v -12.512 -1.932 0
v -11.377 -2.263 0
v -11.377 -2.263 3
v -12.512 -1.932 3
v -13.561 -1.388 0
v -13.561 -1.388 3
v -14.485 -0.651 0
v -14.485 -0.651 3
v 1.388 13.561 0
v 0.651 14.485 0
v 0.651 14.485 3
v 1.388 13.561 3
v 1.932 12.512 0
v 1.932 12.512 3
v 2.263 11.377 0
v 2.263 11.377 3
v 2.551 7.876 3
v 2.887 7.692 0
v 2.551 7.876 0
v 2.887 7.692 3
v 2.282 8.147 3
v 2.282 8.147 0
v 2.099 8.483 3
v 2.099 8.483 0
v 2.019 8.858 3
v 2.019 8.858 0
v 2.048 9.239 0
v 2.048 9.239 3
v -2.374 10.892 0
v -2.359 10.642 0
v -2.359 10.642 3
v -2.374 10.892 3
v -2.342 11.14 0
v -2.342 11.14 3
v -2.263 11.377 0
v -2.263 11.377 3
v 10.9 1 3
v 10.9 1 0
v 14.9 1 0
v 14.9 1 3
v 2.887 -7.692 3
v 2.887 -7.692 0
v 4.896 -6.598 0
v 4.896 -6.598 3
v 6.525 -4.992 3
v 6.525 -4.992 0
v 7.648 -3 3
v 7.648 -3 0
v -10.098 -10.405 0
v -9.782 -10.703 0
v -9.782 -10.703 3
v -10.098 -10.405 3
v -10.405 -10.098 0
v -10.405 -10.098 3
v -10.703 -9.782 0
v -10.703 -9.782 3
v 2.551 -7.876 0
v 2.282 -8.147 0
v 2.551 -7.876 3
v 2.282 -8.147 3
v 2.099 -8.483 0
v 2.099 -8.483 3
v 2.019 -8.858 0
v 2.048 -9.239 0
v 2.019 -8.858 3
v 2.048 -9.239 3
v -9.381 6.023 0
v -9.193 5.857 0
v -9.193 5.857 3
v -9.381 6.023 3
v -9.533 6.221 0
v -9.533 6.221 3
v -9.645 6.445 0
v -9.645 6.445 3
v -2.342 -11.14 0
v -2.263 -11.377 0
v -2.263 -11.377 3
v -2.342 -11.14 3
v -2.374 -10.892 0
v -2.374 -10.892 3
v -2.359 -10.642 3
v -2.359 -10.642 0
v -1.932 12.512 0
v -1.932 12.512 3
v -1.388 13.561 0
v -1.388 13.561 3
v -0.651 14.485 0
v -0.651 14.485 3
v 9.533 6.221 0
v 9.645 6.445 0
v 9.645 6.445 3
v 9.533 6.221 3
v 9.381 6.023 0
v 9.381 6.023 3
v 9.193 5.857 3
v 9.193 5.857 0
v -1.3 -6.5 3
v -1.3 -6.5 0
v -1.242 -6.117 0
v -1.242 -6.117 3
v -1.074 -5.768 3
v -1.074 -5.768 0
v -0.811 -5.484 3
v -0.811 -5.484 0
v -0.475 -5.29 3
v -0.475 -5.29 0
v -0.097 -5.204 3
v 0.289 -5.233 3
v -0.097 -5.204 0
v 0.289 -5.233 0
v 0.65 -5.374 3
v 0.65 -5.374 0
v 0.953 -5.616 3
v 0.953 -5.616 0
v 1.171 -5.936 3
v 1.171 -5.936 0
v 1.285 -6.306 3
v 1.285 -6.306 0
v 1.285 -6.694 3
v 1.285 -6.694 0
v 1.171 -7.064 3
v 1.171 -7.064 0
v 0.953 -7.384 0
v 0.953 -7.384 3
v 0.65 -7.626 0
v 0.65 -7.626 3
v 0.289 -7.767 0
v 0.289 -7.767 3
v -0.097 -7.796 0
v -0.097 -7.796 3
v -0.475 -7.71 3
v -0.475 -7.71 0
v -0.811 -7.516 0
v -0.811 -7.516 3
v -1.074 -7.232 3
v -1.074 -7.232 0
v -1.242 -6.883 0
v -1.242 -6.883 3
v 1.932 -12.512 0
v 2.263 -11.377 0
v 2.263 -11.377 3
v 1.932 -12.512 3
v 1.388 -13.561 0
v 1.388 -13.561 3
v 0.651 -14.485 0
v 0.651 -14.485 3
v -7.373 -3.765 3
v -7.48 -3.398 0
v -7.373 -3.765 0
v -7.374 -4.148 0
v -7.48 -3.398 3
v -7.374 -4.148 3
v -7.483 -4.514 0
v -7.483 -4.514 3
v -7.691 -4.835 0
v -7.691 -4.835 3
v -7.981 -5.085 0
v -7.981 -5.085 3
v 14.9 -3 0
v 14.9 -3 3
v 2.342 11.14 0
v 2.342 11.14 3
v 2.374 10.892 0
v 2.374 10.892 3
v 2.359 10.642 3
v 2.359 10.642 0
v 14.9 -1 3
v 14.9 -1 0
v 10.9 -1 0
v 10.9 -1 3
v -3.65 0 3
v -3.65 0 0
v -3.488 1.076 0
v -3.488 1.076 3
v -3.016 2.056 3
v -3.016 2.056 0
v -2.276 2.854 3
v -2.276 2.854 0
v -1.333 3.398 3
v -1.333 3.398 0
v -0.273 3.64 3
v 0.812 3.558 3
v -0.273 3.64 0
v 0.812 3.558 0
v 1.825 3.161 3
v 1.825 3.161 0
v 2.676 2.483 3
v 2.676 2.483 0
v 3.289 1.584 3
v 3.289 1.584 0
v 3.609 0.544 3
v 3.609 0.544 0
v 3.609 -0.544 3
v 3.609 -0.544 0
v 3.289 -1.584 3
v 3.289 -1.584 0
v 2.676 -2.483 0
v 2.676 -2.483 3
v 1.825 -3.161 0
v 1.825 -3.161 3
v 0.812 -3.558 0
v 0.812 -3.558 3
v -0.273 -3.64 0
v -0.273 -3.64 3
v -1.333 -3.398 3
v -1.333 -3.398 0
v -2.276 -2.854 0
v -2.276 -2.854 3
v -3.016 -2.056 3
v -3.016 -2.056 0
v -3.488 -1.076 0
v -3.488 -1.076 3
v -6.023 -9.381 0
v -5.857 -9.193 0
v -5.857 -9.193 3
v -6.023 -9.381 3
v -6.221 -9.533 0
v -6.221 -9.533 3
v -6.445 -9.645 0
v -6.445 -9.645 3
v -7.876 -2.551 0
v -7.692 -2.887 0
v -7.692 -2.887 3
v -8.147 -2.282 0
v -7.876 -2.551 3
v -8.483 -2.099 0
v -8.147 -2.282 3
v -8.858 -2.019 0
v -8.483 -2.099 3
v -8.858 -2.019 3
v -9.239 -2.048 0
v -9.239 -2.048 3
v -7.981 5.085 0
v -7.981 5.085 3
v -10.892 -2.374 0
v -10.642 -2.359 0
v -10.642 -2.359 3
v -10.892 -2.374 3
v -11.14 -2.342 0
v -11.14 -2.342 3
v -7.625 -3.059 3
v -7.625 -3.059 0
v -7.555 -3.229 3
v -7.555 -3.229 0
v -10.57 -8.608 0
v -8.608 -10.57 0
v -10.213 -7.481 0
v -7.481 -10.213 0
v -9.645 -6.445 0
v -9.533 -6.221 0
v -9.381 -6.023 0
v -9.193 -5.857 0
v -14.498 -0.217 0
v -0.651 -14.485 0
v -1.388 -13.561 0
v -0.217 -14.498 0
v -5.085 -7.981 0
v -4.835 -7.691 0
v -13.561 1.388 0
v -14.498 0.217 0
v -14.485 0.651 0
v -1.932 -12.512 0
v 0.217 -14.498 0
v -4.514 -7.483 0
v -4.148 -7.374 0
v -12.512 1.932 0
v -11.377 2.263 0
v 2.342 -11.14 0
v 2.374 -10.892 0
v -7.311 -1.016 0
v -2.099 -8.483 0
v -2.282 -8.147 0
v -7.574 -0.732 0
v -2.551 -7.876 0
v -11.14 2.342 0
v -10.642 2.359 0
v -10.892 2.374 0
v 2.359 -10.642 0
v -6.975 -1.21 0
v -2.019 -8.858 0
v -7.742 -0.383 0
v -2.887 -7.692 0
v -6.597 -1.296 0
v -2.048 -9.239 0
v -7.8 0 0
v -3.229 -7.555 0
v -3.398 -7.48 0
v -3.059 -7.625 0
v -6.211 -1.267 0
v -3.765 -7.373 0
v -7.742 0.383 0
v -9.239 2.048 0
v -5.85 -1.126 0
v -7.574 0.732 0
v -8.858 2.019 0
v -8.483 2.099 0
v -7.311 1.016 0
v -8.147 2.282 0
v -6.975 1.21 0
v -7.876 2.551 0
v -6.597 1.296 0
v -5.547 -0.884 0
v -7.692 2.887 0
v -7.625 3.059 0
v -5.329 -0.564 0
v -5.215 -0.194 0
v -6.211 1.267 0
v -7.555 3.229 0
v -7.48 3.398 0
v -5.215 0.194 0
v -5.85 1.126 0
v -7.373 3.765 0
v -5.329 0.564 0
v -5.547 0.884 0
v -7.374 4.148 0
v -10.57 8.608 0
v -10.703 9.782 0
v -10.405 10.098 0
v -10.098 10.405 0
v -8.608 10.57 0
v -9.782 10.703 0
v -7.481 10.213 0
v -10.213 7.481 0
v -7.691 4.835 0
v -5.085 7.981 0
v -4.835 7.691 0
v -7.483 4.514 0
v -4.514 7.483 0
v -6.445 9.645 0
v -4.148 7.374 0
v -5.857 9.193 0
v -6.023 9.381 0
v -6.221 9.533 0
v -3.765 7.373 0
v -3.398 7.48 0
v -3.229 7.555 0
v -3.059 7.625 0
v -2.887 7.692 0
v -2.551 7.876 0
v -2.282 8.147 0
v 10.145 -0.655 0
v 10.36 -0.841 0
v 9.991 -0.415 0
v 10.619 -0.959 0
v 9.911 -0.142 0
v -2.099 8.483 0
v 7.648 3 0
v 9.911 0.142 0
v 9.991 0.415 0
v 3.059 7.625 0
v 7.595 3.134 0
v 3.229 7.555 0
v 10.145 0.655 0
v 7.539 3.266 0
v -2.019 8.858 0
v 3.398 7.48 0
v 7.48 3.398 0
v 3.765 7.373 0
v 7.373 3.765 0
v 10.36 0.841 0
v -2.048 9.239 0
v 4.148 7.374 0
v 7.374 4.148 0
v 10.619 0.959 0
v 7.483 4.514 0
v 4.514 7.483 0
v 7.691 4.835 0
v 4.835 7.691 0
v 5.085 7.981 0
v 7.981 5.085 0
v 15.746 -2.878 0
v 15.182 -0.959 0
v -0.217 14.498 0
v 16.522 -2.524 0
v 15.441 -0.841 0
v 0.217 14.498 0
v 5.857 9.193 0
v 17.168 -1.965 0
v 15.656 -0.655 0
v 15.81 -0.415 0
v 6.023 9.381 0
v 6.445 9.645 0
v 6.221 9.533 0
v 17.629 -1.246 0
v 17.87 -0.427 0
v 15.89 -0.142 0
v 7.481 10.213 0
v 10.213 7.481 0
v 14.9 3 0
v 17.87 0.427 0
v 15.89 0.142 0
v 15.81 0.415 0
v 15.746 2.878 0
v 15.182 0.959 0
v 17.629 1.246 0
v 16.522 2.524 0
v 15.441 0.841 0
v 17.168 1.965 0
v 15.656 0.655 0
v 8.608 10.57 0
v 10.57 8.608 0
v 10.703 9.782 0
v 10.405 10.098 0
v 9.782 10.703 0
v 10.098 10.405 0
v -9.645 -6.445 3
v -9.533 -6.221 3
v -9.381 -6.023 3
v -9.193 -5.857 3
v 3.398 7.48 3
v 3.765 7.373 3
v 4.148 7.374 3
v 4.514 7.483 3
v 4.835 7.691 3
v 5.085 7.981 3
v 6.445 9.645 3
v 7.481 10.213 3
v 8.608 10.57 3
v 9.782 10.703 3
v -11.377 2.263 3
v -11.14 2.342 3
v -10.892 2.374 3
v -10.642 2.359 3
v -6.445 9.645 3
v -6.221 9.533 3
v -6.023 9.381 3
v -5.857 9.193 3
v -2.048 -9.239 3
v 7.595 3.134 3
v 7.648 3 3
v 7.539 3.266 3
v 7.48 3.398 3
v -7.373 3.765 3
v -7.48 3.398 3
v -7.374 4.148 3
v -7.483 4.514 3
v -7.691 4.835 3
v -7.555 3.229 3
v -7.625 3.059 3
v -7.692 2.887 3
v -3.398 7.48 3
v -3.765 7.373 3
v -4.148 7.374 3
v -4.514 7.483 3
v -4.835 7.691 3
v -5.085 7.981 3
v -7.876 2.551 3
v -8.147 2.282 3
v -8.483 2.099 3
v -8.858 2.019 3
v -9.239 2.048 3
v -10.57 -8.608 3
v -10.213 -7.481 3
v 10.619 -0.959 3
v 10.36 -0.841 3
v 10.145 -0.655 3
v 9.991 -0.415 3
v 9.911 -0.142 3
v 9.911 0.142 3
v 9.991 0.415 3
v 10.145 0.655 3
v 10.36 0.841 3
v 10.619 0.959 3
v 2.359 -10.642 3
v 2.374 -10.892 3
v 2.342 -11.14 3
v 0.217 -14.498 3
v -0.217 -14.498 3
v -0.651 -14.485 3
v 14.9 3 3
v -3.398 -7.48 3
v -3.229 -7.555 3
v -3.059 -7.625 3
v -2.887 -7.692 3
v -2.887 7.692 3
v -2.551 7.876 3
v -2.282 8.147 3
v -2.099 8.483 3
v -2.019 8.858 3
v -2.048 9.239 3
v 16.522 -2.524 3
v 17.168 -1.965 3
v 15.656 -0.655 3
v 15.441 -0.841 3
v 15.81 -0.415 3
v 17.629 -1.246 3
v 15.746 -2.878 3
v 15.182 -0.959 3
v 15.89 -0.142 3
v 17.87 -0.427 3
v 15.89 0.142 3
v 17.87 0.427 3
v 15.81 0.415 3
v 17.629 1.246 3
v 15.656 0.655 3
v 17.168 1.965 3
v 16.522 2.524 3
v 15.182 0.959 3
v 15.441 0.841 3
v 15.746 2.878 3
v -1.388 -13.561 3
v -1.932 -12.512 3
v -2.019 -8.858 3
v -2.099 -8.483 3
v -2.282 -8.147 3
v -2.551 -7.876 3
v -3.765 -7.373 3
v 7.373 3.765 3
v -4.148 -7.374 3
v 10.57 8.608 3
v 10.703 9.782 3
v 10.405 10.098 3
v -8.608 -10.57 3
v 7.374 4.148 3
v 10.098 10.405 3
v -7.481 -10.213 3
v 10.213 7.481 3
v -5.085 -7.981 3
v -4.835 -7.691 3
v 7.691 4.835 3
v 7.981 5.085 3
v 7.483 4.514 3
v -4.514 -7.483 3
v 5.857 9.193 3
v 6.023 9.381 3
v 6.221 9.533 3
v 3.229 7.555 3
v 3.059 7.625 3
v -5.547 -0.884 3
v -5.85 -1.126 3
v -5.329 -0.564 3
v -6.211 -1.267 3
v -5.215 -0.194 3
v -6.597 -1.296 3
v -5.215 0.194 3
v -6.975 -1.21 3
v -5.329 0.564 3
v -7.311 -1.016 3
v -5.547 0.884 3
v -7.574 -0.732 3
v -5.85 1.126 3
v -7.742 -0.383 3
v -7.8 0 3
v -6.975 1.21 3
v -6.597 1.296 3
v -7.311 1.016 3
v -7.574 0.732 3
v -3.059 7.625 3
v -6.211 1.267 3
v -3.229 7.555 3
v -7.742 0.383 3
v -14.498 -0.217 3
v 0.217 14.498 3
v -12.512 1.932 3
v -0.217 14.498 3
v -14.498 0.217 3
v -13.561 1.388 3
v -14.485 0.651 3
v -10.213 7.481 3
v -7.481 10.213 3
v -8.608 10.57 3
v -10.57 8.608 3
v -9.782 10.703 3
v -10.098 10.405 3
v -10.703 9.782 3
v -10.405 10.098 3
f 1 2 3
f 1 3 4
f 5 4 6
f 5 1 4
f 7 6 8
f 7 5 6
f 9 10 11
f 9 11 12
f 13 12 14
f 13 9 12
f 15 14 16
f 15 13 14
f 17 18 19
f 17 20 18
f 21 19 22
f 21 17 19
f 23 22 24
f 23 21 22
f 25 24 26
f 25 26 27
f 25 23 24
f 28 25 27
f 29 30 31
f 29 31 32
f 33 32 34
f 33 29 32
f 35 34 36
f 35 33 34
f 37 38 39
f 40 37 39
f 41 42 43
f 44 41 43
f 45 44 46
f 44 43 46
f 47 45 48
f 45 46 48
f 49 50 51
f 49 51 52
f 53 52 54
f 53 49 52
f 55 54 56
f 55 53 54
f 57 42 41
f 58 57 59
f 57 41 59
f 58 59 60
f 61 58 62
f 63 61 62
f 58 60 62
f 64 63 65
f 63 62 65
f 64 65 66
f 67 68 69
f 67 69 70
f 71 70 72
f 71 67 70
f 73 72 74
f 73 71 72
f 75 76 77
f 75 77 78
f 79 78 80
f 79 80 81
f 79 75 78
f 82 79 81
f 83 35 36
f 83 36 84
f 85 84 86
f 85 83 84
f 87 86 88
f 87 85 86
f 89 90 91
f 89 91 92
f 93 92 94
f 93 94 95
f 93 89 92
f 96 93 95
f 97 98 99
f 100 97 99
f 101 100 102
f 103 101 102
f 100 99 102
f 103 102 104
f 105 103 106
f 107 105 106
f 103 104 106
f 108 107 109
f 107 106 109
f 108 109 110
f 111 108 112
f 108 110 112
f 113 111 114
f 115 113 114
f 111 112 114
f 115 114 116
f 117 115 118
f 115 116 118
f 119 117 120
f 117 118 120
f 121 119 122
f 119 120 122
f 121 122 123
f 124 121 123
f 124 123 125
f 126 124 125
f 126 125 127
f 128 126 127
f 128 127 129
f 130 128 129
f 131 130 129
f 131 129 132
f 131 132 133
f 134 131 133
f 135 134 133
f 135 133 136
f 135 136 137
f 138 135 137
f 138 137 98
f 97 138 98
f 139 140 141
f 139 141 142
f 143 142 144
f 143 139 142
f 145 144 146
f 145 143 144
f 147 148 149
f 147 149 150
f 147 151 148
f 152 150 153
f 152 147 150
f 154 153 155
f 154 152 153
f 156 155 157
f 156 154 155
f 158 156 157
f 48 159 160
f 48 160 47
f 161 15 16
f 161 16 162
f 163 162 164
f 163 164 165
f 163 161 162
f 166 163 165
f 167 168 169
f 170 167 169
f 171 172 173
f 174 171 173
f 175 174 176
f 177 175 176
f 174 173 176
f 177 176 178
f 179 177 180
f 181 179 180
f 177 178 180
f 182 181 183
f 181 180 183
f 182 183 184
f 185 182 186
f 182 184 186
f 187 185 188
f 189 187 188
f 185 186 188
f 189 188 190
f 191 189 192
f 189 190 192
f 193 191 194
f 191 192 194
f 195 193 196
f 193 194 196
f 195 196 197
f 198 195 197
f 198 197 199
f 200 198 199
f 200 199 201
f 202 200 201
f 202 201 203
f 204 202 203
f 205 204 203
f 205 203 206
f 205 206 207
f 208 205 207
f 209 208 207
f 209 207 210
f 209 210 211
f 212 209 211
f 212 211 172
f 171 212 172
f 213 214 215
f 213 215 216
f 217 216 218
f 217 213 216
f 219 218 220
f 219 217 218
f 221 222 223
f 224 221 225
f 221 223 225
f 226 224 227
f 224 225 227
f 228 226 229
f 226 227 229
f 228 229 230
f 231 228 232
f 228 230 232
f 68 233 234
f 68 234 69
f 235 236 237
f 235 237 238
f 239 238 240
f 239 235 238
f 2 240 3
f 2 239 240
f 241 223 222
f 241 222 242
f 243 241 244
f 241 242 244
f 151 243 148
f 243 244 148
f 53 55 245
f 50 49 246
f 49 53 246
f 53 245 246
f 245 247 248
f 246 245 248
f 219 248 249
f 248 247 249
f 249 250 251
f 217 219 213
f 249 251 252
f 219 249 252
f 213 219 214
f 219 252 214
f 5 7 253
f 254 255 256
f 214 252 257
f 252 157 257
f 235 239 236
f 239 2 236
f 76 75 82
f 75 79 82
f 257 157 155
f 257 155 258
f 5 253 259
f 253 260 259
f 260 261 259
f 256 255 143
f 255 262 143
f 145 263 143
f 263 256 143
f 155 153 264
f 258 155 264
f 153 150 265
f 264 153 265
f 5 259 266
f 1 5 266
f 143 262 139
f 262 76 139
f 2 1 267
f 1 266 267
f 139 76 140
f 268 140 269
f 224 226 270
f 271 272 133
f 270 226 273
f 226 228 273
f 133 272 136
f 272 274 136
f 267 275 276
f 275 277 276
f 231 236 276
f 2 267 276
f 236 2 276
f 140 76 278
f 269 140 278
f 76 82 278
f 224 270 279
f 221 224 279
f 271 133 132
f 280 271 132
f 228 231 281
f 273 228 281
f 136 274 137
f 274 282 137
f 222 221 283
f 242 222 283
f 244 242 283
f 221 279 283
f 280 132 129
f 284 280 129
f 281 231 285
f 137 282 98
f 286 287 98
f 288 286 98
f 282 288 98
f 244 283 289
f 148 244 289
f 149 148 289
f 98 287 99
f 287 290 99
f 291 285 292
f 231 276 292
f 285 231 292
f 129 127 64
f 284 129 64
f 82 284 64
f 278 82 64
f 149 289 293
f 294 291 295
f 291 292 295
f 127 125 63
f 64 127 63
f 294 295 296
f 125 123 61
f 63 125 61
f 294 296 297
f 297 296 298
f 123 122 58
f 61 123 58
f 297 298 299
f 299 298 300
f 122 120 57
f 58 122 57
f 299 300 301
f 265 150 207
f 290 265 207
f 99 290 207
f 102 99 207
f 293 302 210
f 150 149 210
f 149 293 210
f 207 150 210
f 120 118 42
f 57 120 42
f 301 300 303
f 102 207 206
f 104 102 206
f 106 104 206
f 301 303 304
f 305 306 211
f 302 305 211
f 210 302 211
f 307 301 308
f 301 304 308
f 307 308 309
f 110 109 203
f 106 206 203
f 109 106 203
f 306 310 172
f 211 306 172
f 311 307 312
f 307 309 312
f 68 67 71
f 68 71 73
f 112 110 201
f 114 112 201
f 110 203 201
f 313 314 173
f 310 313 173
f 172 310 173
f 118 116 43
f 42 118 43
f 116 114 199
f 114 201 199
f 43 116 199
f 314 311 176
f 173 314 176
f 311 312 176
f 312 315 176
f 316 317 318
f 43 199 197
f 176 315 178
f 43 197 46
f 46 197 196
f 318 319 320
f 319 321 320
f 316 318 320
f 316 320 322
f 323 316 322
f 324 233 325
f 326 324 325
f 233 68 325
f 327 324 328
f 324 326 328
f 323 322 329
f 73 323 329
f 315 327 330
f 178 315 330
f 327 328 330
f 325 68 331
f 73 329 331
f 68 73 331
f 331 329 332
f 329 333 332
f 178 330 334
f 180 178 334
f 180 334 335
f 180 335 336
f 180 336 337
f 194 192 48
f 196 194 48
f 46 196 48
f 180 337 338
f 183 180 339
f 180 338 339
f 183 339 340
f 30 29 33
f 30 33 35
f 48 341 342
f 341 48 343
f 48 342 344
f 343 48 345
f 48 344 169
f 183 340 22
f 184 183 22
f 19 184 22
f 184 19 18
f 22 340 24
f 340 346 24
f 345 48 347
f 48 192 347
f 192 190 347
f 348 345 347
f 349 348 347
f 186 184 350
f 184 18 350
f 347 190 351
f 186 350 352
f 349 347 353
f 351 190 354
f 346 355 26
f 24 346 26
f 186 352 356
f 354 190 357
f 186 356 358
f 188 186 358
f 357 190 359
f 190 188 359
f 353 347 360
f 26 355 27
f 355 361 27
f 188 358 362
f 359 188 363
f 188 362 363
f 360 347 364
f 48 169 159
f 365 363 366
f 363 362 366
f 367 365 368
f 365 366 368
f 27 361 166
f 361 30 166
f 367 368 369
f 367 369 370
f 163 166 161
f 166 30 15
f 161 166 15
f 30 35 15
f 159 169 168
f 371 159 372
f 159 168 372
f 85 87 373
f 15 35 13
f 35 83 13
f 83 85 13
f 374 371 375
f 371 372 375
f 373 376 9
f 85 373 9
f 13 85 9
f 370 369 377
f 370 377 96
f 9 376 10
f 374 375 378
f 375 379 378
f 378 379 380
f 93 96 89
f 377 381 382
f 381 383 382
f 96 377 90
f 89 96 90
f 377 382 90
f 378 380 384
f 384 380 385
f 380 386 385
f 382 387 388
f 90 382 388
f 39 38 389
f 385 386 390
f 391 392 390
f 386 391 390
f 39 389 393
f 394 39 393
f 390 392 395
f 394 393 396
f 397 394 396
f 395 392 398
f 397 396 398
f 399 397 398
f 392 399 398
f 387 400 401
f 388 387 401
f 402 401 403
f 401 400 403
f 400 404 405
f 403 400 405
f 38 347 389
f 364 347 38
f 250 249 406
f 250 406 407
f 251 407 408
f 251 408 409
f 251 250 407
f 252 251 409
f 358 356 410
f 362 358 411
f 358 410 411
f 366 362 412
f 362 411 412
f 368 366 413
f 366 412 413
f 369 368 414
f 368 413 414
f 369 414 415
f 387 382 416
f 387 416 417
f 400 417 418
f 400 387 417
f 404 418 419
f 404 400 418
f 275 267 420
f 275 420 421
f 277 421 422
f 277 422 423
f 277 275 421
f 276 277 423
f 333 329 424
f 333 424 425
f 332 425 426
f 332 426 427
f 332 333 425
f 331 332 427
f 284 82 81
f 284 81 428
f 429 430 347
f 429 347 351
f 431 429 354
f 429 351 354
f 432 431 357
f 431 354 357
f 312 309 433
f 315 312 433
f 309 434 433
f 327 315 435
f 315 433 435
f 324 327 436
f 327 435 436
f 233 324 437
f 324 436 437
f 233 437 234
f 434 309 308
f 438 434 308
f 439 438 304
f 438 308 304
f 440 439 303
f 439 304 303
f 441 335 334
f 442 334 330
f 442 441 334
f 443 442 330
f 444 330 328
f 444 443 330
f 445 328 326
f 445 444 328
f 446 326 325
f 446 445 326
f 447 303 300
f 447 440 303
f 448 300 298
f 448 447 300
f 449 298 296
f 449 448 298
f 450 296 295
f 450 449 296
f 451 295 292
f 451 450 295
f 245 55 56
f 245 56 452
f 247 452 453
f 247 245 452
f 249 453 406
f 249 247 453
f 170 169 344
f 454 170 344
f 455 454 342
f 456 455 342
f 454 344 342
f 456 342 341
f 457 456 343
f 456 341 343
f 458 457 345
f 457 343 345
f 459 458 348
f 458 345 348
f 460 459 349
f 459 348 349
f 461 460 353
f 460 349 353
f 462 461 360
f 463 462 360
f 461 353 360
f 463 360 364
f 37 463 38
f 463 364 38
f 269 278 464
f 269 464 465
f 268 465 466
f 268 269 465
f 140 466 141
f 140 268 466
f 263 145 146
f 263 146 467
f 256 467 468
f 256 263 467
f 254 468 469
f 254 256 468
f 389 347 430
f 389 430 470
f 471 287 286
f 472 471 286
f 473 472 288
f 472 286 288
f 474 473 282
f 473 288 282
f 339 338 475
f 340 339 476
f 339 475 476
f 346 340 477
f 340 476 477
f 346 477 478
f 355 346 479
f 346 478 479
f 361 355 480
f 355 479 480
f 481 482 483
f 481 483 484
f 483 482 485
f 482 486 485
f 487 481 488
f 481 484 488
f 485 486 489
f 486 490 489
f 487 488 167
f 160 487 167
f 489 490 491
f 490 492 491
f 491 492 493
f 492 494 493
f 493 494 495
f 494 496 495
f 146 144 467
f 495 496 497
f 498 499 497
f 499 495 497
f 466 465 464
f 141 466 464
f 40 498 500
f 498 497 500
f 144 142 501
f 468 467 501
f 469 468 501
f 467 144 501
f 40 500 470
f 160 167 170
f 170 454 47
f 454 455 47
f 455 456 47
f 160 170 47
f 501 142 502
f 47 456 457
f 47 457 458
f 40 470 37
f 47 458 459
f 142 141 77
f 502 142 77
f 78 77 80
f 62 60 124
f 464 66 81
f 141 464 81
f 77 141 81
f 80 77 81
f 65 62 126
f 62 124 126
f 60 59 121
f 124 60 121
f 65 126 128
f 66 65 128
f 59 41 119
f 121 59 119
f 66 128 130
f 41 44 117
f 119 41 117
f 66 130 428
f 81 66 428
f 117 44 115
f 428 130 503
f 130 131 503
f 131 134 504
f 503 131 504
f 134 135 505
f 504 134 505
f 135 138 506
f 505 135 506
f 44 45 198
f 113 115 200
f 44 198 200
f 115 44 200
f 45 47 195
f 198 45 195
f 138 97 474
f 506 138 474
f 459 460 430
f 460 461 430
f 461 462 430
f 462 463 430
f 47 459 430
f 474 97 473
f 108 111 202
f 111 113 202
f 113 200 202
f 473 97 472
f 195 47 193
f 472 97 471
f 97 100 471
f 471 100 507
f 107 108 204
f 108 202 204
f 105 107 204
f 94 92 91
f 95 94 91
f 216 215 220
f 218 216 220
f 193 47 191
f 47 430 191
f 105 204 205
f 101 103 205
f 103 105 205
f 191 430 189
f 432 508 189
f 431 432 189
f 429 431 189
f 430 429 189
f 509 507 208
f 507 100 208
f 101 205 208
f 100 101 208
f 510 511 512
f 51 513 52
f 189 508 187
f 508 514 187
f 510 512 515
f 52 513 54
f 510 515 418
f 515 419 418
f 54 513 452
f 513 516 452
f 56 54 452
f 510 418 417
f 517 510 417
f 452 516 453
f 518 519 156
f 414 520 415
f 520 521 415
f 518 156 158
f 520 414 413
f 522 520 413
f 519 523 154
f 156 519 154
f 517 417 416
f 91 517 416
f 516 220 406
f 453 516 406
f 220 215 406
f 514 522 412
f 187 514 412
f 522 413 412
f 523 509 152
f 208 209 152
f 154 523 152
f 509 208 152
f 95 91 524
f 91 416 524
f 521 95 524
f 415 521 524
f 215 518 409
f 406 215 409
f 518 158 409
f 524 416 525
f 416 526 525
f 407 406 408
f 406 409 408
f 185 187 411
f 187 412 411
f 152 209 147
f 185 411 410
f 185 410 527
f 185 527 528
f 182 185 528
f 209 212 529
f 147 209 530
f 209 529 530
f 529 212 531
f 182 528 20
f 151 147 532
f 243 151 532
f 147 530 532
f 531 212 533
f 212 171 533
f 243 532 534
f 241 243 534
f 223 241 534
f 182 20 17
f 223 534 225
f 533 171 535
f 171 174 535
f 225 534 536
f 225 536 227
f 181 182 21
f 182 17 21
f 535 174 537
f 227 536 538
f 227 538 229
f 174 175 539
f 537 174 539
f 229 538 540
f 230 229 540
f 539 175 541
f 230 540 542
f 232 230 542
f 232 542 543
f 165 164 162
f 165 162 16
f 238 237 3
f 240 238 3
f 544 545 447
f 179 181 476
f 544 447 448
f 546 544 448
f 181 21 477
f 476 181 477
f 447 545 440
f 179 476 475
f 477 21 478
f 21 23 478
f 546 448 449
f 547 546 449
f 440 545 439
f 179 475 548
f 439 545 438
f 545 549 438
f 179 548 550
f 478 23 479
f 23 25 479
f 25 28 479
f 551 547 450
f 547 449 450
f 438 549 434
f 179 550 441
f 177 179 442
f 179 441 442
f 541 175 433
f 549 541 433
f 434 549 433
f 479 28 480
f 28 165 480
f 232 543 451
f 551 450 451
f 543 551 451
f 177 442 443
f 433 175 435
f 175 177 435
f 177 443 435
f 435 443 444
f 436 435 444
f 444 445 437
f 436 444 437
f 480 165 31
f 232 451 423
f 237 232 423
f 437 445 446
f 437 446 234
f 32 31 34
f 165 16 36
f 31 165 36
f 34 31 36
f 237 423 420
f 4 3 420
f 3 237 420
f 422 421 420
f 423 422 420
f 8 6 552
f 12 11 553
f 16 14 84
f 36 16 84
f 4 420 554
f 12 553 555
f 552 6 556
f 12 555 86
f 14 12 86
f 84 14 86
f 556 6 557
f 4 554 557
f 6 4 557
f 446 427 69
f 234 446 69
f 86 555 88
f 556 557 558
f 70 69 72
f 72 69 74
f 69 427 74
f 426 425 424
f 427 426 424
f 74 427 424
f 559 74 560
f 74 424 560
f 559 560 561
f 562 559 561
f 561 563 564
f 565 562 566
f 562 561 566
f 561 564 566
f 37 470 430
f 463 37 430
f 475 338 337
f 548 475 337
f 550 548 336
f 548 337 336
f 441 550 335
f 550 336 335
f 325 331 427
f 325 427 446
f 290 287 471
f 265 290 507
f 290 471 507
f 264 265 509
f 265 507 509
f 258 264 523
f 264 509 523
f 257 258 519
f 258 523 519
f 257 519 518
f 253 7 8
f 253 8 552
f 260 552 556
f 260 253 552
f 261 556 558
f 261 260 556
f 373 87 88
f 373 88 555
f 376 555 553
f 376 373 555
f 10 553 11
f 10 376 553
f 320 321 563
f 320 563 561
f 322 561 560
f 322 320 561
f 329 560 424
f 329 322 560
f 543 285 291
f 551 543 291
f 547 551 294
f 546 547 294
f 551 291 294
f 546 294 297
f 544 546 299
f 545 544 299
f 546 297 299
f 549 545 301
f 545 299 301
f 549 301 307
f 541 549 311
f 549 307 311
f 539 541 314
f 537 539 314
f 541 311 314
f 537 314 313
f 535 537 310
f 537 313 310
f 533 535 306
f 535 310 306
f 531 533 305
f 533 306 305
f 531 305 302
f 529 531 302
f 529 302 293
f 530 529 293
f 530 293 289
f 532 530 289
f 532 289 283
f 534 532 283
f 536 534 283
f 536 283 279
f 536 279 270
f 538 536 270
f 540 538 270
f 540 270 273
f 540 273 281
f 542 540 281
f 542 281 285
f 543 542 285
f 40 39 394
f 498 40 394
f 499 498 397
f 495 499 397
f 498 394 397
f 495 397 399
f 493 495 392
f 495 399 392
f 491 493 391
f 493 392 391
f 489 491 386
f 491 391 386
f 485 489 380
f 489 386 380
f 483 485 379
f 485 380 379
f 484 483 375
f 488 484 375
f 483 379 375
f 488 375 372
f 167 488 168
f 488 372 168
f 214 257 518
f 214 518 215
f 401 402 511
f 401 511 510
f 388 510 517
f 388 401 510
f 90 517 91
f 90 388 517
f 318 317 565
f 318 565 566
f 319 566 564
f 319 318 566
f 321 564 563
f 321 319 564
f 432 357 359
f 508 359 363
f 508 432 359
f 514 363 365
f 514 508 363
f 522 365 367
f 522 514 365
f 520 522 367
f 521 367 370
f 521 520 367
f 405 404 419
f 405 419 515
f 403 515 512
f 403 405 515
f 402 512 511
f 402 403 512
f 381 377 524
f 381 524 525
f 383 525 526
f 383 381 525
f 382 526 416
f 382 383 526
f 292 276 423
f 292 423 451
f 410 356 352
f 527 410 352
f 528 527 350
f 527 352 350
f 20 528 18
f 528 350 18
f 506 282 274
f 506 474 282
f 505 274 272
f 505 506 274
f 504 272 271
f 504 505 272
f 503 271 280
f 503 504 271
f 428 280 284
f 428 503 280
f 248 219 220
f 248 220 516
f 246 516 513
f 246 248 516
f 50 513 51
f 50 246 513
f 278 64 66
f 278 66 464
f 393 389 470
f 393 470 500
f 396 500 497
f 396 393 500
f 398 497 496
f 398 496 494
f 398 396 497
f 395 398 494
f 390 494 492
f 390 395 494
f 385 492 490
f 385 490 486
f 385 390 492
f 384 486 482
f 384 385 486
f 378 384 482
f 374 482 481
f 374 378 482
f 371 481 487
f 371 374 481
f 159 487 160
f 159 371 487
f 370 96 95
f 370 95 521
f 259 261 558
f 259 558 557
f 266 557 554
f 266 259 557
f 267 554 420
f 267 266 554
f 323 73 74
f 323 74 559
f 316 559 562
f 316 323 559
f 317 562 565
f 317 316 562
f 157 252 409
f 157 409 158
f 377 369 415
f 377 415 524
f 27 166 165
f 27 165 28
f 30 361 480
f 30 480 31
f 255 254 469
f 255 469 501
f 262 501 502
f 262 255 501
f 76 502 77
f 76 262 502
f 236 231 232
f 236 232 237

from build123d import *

# Parameters (mm, degrees)
POSICIONAMENTOS_R               = 8.2157
BASE_DEPTH                      = 3
FURO_DE_DI_METRO_2_6_2_6_1_D    = 2.6
BASE_DENTE_DEPTH                = 3
RAIO_DENTE_R                    = 1.342367201
PADR_OCIRCULAR1_COUNT           = 8
RAIO_DENTE_OF_PADR_OCIRCULAR1_R = 1.342367201
RESSALTO_EXTRUS_O1_DEPTH        = 3
FURO_DE_DI_METRO_7_3_7_3_1_D    = 7.3


with BuildPart() as part:
    # Posicionamentos → Base (new body)
    with BuildSketch(Plane.XY):
        Circle(POSICIONAMENTOS_R)
    extrude(amount=BASE_DEPTH)

    # Furo de diâmetro Ø2.6 (2.6)1 (through all)
    with Locations(Plane.XY.offset(3)):
        with Locations((0, -6.5), (-6.5, 0)):
            Hole(FURO_DE_DI_METRO_2_6_2_6_1_D / 2)

    # Dente → Base Dente (add, through all)
    with BuildSketch(Plane.XY):
        with BuildLine():
            Line((2.358922349, 10.642131153), (1.777928991, 8.021015833))
            ThreePointArc((1.777928991, 8.021015833), (0, 8.2157), (-1.777928991, 8.021015833))
            Line((-1.777928991, 8.021015833), (-2.358922349, 10.642131153))
            ThreePointArc((-2.358922349, 10.642131153), (-2.364262787, 11.016570047), (-2.263047735, 11.377109253))
            ThreePointArc((-2.263047735, 11.377109253), (-1.685191659, 13.049606095), (-0.650923694, 14.48538223))
            ThreePointArc((-0.650923694, 14.48538223), (0, 14.5), (0.650923694, 14.48538223))
            ThreePointArc((0.650923694, 14.48538223), (1.685191659, 13.049606095), (2.263047735, 11.377109253))
            ThreePointArc((2.263047735, 11.377109253), (2.364262787, 11.016570047), (2.358922349, 10.642131153))
        make_face()
    base_dente = extrude(amount=BASE_DENTE_DEPTH)

    # Raio Dente
    raio_dente_edges = [part.edges().sort_by_distance(p)[0] for p in [
        (-1.777928991, 8.021015833, 1.5),
        (1.777928991, 8.021015833, 1.5),
    ]]
    fillet(raio_dente_edges, radius=RAIO_DENTE_R)

    # PadrãoCircular1: Base Dente ×8 about axis, 2 skipped
    padr_ocircular1_axis = Axis((0, 0, 0), (0, 0, -1))
    add([base_dente.rotate(padr_ocircular1_axis, i * 360 / PADR_OCIRCULAR1_COUNT) for i in range(1, PADR_OCIRCULAR1_COUNT) if i not in (2, 3)])

    # Raio Dente of PadrãoCircular1
    raio_dente_of_padr_ocircular1_edges = [part.edges().sort_by_distance(p)[0] for p in [
        (4.414529041, 6.928900334, 1.5),
        (6.928900334, 4.414529041, 1.5),
        (1.777928991, -8.021015833, 1.5),
        (-1.777928991, -8.021015833, 1.5),
        (-4.414529041, -6.928900334, 1.5),
        (-6.928900334, -4.414529041, 1.5),
        (-8.021015833, -1.777928991, 1.5),
        (-8.021015833, 1.777928991, 1.5),
        (-6.928900334, 4.414529041, 1.5),
        (-4.414529041, 6.928900334, 1.5),
    ]]
    fillet(raio_dente_of_padr_ocircular1_edges, radius=RAIO_DENTE_OF_PADR_OCIRCULAR1_R)

    # Encaixe → Ressalto-extrusão1 (add, through all)
    with BuildSketch(Plane.XY):
        with BuildLine():
            Line((0, 3), (14.900434401, 3))
            ThreePointArc((14.900434401, 3), (17.900434401, 0), (14.900434401, -3))
            Line((14.900434401, -3), (0, -3))
            Line((0, -3), (0, 3))
        make_face()
        with BuildLine():
            Line((10.900434401, 1), (14.900434401, 1))
            ThreePointArc((14.900434401, 1), (15.900434401, 0), (14.900434401, -1))
            Line((14.900434401, -1), (10.900434401, -1))
            ThreePointArc((10.900434401, -1), (9.900434401, 0), (10.900434401, 1))
        make_face(mode=Mode.SUBTRACT)
    extrude(amount=RESSALTO_EXTRUS_O1_DEPTH)

    # Furo de diâmetro Ø7.3 (7.3)1 (through all)
    with Locations(Plane.XY.offset(3)):
        with Locations((0, 0)):
            Hole(FURO_DE_DI_METRO_7_3_7_3_1_D / 2)


solid = part.part
